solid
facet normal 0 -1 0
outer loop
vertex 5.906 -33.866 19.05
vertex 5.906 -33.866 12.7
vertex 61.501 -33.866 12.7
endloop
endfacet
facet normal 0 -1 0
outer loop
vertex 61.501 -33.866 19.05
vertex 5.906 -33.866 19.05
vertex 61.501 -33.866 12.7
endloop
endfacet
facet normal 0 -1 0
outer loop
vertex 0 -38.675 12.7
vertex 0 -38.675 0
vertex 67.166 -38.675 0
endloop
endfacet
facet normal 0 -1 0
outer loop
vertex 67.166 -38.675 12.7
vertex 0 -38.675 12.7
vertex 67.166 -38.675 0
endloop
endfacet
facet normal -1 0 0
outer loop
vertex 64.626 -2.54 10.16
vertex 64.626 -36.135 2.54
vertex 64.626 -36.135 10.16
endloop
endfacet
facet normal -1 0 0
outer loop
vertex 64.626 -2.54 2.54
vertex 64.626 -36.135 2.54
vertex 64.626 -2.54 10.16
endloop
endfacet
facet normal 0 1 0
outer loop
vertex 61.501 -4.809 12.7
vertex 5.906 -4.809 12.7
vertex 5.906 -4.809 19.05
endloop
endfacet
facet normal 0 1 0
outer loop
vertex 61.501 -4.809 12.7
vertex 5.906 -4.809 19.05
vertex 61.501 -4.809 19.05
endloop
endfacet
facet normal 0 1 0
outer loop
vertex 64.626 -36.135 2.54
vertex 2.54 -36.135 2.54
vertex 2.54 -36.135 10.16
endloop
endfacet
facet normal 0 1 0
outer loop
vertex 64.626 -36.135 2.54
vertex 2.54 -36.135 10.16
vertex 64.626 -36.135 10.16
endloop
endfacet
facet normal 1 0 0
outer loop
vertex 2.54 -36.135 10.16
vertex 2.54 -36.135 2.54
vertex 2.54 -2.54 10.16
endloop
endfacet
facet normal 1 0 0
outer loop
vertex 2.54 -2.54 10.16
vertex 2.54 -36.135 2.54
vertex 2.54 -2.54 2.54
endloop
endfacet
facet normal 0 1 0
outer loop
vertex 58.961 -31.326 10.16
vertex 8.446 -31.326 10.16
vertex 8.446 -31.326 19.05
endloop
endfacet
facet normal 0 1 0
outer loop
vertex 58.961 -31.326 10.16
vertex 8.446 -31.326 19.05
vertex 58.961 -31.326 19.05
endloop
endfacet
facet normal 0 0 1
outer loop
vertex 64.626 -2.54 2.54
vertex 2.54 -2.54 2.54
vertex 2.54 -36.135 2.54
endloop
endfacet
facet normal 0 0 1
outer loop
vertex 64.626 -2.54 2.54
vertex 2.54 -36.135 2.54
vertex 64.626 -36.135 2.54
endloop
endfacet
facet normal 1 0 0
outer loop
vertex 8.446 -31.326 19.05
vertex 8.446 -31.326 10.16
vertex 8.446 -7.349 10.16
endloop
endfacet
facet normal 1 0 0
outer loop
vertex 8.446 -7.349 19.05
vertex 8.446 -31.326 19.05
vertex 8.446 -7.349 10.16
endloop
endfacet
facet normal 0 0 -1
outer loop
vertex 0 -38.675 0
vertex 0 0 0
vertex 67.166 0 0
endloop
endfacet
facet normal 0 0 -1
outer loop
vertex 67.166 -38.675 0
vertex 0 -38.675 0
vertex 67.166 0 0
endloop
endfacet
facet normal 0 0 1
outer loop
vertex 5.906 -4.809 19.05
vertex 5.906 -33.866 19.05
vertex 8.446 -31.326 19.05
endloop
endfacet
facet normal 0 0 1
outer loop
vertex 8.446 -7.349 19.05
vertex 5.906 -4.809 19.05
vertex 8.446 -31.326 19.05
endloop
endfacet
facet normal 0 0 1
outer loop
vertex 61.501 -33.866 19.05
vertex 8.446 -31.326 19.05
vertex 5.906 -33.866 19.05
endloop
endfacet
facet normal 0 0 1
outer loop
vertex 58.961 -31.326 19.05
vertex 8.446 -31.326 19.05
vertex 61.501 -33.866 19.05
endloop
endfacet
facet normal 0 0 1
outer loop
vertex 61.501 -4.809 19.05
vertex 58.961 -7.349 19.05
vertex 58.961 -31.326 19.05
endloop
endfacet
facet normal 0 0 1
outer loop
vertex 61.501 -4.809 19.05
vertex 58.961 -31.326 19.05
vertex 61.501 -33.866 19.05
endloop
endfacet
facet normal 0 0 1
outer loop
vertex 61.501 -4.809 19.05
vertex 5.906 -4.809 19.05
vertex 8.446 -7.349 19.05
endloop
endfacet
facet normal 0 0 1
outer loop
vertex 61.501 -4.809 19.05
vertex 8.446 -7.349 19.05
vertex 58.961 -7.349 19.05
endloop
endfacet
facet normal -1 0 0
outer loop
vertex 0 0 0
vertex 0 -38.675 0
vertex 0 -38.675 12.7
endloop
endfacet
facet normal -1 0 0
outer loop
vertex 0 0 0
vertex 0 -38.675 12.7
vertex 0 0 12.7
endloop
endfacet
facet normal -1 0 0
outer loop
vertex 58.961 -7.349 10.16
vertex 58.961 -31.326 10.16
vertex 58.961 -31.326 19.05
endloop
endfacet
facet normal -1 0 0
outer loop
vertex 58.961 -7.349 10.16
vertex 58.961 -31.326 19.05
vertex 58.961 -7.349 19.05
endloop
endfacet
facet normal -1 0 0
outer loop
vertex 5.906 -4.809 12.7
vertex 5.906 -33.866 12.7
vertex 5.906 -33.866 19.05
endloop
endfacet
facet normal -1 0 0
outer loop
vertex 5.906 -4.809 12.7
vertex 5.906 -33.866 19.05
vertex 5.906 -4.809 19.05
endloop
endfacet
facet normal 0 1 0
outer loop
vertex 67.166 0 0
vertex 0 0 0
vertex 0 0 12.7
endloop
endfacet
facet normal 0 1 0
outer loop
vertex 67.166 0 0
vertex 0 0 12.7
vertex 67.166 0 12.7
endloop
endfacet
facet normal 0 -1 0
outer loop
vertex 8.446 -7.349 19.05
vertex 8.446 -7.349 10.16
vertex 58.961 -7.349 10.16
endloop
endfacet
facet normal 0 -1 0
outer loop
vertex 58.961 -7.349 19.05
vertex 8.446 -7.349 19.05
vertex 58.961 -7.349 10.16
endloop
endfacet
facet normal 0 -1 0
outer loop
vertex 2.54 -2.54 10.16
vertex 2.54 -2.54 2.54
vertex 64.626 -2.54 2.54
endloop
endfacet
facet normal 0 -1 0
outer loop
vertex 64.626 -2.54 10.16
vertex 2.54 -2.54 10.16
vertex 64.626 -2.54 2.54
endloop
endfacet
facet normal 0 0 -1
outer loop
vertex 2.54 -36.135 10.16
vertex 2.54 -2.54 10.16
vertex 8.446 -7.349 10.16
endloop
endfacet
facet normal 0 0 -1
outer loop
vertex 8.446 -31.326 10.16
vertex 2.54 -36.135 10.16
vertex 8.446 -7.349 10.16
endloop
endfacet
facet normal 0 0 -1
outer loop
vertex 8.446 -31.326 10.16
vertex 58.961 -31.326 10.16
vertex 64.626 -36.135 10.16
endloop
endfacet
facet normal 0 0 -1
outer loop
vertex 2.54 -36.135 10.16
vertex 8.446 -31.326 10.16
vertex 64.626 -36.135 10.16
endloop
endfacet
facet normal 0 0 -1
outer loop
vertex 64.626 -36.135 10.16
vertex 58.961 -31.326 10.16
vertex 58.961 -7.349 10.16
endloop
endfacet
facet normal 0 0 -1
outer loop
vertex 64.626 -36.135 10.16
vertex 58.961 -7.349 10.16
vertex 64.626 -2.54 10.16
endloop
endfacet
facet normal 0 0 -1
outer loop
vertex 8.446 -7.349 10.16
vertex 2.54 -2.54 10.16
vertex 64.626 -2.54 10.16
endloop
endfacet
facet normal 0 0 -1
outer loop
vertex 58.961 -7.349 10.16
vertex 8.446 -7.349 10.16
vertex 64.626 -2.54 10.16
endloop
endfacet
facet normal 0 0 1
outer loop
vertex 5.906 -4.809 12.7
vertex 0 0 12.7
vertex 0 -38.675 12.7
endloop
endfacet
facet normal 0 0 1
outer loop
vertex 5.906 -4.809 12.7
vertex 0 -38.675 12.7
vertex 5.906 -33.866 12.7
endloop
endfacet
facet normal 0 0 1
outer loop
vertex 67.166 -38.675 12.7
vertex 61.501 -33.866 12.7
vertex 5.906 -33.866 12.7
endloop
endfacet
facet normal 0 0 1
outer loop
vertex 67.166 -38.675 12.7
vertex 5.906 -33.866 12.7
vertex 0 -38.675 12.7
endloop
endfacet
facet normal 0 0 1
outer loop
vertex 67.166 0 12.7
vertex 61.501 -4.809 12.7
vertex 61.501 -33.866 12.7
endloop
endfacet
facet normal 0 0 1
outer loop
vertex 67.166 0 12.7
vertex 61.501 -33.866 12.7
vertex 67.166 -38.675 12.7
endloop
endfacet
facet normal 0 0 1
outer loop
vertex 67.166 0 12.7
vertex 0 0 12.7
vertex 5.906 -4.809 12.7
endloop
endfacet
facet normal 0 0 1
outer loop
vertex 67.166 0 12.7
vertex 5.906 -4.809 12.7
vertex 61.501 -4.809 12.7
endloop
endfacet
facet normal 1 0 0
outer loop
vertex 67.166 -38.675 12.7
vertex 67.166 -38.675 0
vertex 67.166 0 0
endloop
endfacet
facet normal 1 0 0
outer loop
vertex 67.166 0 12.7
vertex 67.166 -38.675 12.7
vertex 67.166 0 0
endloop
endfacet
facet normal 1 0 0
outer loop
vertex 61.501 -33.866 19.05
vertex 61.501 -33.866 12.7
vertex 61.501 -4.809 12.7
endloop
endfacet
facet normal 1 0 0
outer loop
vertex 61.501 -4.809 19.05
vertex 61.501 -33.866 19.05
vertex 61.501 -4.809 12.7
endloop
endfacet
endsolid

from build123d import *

# Parameters (mm, degrees)
F0_W     = 67.1657696366
F0_H     = 38.6754088104
F1_DEPTH = 12.7
F2_W     = 55.595561862
F2_H     = 29.0567195043
F3_DEPTH = 6.35
F4_T     = -2.54


with BuildPart() as f1:
    # F0 (on Top) → F1 (new body)
    with BuildSketch(Plane.XY):
        with Locations((33.5828848183, -19.3377044052)):
            Rectangle(F0_W, F0_H)
    extrude(amount=F1_DEPTH)

    # F2 (on face) → F3 (join)
    with BuildSketch(Plane.XY.offset(12.7)):
        with Locations((33.7035246193, -19.3377044052)):
            Rectangle(F2_W, F2_H)
    extrude(amount=F3_DEPTH)

    # F4
    f4_openings = [f1.faces().sort_by_distance(p)[0] for p in [
        (33.703525, -19.337704, 19.05),
    ]]
    offset(amount=F4_T, openings=f4_openings, kind=Kind.INTERSECTION)


solid = f1.part
